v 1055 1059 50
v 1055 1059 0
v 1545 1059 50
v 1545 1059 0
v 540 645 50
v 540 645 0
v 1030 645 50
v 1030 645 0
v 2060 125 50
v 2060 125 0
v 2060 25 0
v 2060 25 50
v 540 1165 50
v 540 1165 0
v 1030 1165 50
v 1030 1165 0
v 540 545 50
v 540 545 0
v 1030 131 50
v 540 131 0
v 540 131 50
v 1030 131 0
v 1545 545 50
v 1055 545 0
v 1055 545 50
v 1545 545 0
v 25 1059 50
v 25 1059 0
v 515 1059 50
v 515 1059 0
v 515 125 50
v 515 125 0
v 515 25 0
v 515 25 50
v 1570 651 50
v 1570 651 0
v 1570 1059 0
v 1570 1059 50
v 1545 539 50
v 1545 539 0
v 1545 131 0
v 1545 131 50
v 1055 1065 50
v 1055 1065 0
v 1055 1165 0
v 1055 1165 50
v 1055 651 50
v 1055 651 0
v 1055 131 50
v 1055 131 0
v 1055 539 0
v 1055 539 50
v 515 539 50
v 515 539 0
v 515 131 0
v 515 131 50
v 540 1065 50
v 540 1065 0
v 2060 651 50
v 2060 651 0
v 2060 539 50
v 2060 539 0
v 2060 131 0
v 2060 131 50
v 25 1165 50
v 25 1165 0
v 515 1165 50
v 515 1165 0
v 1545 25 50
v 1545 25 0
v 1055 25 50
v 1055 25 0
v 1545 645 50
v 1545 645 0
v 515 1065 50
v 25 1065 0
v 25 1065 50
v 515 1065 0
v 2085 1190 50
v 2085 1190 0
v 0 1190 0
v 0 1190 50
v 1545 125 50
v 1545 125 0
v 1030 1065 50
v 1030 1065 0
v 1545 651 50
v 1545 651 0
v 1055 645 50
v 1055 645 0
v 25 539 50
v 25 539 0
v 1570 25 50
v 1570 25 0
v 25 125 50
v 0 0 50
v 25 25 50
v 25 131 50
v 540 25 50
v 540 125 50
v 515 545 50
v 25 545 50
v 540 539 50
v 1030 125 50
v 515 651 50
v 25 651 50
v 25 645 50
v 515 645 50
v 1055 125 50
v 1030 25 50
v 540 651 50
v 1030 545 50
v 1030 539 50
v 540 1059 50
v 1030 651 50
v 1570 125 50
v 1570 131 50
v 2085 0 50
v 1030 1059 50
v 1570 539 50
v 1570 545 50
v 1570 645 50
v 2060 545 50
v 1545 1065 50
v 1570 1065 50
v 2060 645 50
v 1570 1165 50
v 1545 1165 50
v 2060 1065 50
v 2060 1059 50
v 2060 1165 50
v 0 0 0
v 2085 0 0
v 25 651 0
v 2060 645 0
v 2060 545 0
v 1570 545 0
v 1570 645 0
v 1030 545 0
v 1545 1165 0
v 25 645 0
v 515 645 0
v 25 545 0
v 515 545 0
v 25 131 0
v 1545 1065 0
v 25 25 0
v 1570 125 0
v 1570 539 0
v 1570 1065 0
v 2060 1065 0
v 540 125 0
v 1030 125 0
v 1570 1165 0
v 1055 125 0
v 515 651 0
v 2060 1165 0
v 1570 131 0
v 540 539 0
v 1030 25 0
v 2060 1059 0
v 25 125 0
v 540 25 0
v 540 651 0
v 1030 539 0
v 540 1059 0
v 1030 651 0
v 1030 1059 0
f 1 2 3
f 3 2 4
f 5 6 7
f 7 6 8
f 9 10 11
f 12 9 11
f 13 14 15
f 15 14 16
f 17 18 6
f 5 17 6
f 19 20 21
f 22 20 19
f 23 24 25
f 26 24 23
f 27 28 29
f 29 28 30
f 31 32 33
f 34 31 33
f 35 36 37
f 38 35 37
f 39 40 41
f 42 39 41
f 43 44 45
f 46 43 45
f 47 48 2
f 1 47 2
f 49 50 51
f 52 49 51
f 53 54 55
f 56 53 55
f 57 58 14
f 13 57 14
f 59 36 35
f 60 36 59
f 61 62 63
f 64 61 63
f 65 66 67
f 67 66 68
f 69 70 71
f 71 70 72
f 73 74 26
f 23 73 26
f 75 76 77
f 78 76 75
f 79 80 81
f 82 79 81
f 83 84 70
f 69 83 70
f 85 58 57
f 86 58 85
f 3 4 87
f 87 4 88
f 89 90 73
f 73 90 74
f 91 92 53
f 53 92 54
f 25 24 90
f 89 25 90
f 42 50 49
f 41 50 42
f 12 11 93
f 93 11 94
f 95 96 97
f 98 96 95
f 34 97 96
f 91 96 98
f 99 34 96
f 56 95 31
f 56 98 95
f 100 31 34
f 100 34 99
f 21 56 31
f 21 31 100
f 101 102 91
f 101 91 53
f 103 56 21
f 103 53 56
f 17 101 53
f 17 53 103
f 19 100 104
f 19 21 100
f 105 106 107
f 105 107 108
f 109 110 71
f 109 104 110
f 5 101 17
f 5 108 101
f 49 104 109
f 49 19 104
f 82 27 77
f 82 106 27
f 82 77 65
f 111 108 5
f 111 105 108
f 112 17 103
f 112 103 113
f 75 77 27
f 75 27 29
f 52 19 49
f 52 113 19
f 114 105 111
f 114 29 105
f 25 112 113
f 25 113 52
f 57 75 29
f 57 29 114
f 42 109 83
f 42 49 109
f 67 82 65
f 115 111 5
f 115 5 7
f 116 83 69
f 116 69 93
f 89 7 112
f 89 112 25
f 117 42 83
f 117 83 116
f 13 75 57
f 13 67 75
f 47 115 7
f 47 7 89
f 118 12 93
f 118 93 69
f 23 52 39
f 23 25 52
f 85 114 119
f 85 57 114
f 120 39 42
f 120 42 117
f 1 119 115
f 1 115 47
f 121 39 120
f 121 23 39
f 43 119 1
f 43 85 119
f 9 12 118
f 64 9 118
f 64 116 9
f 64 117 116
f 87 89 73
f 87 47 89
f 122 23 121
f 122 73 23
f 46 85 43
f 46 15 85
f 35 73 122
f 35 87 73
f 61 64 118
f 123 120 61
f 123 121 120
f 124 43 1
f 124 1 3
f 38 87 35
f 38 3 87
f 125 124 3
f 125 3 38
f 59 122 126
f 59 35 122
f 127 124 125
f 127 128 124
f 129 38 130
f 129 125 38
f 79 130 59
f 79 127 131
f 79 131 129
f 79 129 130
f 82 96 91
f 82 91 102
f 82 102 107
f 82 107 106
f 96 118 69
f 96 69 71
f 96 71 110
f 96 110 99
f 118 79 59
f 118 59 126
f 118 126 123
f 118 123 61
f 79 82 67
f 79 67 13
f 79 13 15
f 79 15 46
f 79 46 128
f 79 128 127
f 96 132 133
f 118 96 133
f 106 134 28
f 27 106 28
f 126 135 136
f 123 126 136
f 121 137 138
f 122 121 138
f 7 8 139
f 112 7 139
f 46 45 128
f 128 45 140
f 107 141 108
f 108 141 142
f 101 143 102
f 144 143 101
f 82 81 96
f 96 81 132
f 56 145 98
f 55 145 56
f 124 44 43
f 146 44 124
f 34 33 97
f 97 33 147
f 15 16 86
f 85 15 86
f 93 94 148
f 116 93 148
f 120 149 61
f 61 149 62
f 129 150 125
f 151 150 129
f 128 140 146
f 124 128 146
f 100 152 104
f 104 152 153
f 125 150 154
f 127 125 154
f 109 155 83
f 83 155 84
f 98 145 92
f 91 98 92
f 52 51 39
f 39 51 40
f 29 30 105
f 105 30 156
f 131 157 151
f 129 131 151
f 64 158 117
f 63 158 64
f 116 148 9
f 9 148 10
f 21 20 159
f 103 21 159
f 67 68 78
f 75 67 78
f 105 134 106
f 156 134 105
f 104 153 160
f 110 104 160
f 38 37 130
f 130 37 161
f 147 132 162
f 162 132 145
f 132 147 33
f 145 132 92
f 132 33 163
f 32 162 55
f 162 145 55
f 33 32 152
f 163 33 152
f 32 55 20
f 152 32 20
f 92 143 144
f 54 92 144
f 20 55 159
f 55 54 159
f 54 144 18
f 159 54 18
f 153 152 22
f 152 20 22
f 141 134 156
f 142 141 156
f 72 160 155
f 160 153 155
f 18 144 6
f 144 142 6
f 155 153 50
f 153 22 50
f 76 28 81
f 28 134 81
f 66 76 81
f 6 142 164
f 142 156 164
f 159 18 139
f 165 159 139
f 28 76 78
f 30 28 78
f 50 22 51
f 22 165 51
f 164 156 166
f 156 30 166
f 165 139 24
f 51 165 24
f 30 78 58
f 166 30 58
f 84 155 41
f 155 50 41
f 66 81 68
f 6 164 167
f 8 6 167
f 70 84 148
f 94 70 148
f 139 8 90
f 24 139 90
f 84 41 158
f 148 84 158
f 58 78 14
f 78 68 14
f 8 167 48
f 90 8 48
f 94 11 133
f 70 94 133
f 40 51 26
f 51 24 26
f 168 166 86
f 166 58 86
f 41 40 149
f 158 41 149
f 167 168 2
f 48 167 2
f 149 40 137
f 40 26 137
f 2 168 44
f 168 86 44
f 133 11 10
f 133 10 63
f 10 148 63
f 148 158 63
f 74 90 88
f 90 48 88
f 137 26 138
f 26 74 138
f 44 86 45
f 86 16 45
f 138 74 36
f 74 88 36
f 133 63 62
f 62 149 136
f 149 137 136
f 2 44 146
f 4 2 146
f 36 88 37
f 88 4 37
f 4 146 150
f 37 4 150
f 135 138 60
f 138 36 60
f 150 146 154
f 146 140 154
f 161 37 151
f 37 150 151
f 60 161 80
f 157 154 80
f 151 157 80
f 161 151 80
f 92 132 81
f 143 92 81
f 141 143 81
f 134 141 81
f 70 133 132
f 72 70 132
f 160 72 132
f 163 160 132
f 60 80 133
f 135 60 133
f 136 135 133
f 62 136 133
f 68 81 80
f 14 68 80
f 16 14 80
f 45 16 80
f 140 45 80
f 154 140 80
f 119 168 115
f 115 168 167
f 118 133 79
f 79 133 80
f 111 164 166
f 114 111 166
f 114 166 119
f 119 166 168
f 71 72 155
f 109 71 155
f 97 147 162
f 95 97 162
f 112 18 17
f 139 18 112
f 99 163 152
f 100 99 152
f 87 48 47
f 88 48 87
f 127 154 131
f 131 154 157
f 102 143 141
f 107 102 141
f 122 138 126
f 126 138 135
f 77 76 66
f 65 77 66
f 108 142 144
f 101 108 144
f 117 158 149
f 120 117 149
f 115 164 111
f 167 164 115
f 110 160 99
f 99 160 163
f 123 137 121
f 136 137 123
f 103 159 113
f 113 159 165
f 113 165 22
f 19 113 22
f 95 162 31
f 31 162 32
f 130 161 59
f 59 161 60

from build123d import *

# Parameters (mm, degrees)
F0_W     = 490
F0_H     = 6
F1_DEPTH = 50


# Not quite as in the source:
# - a feature names something its author has since deleted; it is built from what else it names
# - the program builds the solid bodies; features that only make, move or delete a surface that nothing else refers to are left out


with BuildPart() as f1:
    # F0 (on Top) → F1 (new body)
    with BuildSketch(Plane.XY):
        Polygon((0, 1190), (0, 0), (515, 0), (540, 0), (540, 25), (540, 125), (540, 131), (540, 539), (540, 545), (540, 645), (540, 651), (540, 1059), (540, 1065), (540, 1165), (540, 1190), (515, 1190), align=None)
        Polygon((25, 1065), (25, 1165), (515, 1165), (515, 1065), (515, 1059), (515, 651), (515, 645), (515, 545), (515, 539), (515, 131), (515, 125), (515, 25), (25, 25), (25, 125), (25, 131), (25, 539), (25, 545), (25, 645), (25, 651), (25, 1059), align=None, mode=Mode.SUBTRACT)
        Polygon((540, 25), (540, 0), (1030, 0), (1055, 0), (1055, 25), (1055, 125), (1055, 131), (1055, 539), (1055, 545), (1055, 645), (1055, 651), (1055, 1059), (1055, 1065), (1055, 1165), (1055, 1190), (1030, 1190), (540, 1190), (540, 1165), (1030, 1165), (1030, 1065), (1030, 1059), (1030, 651), (1030, 645), (1030, 545), (1030, 539), (1030, 131), (1030, 125), (1030, 25), align=None)
        Polygon((1055, 25), (1055, 0), (1545, 0), (1570, 0), (1570, 25), (1570, 125), (1570, 131), (1570, 539), (1570, 545), (1570, 645), (1570, 651), (1570, 1059), (1570, 1065), (1570, 1165), (1570, 1190), (1545, 1190), (1055, 1190), (1055, 1165), (1545, 1165), (1545, 1065), (1545, 1059), (1545, 651), (1545, 645), (1545, 545), (1545, 539), (1545, 131), (1545, 125), (1545, 25), align=None)
        Polygon((1570, 25), (1570, 0), (2085, 0), (2085, 1190), (1570, 1190), (1570, 1165), (2060, 1165), (2060, 1065), (2060, 1059), (2060, 651), (2060, 645), (2060, 545), (2060, 539), (2060, 131), (2060, 125), (2060, 25), align=None)
        with Locations((270, 542)):
            Rectangle(F0_W, F0_H)
        with Locations((270, 128)):
            Rectangle(F0_W, F0_H)
        with Locations((270, 648)):
            Rectangle(F0_W, F0_H)
        with Locations((270, 1062)):
            Rectangle(F0_W, F0_H)
        with Locations((785, 648)):
            Rectangle(F0_W, F0_H)
        with Locations((1300, 648)):
            Rectangle(F0_W, F0_H)
        with Locations((1300, 542)):
            Rectangle(F0_W, F0_H)
        with Locations((785, 542)):
            Rectangle(F0_W, F0_H)
        with Locations((1815, 542)):
            Rectangle(F0_W, F0_H)
        with Locations((1815, 648)):
            Rectangle(F0_W, F0_H)
        with Locations((1815, 1062)):
            Rectangle(F0_W, F0_H)
        with Locations((1300, 1062)):
            Rectangle(F0_W, F0_H)
        with Locations((785, 1062)):
            Rectangle(F0_W, F0_H)
        with Locations((1815, 128)):
            Rectangle(F0_W, F0_H)
        with Locations((785, 128)):
            Rectangle(F0_W, F0_H)
        with Locations((1300, 128)):
            Rectangle(F0_W, F0_H)
    extrude(amount=F1_DEPTH)


solid = f1.part
